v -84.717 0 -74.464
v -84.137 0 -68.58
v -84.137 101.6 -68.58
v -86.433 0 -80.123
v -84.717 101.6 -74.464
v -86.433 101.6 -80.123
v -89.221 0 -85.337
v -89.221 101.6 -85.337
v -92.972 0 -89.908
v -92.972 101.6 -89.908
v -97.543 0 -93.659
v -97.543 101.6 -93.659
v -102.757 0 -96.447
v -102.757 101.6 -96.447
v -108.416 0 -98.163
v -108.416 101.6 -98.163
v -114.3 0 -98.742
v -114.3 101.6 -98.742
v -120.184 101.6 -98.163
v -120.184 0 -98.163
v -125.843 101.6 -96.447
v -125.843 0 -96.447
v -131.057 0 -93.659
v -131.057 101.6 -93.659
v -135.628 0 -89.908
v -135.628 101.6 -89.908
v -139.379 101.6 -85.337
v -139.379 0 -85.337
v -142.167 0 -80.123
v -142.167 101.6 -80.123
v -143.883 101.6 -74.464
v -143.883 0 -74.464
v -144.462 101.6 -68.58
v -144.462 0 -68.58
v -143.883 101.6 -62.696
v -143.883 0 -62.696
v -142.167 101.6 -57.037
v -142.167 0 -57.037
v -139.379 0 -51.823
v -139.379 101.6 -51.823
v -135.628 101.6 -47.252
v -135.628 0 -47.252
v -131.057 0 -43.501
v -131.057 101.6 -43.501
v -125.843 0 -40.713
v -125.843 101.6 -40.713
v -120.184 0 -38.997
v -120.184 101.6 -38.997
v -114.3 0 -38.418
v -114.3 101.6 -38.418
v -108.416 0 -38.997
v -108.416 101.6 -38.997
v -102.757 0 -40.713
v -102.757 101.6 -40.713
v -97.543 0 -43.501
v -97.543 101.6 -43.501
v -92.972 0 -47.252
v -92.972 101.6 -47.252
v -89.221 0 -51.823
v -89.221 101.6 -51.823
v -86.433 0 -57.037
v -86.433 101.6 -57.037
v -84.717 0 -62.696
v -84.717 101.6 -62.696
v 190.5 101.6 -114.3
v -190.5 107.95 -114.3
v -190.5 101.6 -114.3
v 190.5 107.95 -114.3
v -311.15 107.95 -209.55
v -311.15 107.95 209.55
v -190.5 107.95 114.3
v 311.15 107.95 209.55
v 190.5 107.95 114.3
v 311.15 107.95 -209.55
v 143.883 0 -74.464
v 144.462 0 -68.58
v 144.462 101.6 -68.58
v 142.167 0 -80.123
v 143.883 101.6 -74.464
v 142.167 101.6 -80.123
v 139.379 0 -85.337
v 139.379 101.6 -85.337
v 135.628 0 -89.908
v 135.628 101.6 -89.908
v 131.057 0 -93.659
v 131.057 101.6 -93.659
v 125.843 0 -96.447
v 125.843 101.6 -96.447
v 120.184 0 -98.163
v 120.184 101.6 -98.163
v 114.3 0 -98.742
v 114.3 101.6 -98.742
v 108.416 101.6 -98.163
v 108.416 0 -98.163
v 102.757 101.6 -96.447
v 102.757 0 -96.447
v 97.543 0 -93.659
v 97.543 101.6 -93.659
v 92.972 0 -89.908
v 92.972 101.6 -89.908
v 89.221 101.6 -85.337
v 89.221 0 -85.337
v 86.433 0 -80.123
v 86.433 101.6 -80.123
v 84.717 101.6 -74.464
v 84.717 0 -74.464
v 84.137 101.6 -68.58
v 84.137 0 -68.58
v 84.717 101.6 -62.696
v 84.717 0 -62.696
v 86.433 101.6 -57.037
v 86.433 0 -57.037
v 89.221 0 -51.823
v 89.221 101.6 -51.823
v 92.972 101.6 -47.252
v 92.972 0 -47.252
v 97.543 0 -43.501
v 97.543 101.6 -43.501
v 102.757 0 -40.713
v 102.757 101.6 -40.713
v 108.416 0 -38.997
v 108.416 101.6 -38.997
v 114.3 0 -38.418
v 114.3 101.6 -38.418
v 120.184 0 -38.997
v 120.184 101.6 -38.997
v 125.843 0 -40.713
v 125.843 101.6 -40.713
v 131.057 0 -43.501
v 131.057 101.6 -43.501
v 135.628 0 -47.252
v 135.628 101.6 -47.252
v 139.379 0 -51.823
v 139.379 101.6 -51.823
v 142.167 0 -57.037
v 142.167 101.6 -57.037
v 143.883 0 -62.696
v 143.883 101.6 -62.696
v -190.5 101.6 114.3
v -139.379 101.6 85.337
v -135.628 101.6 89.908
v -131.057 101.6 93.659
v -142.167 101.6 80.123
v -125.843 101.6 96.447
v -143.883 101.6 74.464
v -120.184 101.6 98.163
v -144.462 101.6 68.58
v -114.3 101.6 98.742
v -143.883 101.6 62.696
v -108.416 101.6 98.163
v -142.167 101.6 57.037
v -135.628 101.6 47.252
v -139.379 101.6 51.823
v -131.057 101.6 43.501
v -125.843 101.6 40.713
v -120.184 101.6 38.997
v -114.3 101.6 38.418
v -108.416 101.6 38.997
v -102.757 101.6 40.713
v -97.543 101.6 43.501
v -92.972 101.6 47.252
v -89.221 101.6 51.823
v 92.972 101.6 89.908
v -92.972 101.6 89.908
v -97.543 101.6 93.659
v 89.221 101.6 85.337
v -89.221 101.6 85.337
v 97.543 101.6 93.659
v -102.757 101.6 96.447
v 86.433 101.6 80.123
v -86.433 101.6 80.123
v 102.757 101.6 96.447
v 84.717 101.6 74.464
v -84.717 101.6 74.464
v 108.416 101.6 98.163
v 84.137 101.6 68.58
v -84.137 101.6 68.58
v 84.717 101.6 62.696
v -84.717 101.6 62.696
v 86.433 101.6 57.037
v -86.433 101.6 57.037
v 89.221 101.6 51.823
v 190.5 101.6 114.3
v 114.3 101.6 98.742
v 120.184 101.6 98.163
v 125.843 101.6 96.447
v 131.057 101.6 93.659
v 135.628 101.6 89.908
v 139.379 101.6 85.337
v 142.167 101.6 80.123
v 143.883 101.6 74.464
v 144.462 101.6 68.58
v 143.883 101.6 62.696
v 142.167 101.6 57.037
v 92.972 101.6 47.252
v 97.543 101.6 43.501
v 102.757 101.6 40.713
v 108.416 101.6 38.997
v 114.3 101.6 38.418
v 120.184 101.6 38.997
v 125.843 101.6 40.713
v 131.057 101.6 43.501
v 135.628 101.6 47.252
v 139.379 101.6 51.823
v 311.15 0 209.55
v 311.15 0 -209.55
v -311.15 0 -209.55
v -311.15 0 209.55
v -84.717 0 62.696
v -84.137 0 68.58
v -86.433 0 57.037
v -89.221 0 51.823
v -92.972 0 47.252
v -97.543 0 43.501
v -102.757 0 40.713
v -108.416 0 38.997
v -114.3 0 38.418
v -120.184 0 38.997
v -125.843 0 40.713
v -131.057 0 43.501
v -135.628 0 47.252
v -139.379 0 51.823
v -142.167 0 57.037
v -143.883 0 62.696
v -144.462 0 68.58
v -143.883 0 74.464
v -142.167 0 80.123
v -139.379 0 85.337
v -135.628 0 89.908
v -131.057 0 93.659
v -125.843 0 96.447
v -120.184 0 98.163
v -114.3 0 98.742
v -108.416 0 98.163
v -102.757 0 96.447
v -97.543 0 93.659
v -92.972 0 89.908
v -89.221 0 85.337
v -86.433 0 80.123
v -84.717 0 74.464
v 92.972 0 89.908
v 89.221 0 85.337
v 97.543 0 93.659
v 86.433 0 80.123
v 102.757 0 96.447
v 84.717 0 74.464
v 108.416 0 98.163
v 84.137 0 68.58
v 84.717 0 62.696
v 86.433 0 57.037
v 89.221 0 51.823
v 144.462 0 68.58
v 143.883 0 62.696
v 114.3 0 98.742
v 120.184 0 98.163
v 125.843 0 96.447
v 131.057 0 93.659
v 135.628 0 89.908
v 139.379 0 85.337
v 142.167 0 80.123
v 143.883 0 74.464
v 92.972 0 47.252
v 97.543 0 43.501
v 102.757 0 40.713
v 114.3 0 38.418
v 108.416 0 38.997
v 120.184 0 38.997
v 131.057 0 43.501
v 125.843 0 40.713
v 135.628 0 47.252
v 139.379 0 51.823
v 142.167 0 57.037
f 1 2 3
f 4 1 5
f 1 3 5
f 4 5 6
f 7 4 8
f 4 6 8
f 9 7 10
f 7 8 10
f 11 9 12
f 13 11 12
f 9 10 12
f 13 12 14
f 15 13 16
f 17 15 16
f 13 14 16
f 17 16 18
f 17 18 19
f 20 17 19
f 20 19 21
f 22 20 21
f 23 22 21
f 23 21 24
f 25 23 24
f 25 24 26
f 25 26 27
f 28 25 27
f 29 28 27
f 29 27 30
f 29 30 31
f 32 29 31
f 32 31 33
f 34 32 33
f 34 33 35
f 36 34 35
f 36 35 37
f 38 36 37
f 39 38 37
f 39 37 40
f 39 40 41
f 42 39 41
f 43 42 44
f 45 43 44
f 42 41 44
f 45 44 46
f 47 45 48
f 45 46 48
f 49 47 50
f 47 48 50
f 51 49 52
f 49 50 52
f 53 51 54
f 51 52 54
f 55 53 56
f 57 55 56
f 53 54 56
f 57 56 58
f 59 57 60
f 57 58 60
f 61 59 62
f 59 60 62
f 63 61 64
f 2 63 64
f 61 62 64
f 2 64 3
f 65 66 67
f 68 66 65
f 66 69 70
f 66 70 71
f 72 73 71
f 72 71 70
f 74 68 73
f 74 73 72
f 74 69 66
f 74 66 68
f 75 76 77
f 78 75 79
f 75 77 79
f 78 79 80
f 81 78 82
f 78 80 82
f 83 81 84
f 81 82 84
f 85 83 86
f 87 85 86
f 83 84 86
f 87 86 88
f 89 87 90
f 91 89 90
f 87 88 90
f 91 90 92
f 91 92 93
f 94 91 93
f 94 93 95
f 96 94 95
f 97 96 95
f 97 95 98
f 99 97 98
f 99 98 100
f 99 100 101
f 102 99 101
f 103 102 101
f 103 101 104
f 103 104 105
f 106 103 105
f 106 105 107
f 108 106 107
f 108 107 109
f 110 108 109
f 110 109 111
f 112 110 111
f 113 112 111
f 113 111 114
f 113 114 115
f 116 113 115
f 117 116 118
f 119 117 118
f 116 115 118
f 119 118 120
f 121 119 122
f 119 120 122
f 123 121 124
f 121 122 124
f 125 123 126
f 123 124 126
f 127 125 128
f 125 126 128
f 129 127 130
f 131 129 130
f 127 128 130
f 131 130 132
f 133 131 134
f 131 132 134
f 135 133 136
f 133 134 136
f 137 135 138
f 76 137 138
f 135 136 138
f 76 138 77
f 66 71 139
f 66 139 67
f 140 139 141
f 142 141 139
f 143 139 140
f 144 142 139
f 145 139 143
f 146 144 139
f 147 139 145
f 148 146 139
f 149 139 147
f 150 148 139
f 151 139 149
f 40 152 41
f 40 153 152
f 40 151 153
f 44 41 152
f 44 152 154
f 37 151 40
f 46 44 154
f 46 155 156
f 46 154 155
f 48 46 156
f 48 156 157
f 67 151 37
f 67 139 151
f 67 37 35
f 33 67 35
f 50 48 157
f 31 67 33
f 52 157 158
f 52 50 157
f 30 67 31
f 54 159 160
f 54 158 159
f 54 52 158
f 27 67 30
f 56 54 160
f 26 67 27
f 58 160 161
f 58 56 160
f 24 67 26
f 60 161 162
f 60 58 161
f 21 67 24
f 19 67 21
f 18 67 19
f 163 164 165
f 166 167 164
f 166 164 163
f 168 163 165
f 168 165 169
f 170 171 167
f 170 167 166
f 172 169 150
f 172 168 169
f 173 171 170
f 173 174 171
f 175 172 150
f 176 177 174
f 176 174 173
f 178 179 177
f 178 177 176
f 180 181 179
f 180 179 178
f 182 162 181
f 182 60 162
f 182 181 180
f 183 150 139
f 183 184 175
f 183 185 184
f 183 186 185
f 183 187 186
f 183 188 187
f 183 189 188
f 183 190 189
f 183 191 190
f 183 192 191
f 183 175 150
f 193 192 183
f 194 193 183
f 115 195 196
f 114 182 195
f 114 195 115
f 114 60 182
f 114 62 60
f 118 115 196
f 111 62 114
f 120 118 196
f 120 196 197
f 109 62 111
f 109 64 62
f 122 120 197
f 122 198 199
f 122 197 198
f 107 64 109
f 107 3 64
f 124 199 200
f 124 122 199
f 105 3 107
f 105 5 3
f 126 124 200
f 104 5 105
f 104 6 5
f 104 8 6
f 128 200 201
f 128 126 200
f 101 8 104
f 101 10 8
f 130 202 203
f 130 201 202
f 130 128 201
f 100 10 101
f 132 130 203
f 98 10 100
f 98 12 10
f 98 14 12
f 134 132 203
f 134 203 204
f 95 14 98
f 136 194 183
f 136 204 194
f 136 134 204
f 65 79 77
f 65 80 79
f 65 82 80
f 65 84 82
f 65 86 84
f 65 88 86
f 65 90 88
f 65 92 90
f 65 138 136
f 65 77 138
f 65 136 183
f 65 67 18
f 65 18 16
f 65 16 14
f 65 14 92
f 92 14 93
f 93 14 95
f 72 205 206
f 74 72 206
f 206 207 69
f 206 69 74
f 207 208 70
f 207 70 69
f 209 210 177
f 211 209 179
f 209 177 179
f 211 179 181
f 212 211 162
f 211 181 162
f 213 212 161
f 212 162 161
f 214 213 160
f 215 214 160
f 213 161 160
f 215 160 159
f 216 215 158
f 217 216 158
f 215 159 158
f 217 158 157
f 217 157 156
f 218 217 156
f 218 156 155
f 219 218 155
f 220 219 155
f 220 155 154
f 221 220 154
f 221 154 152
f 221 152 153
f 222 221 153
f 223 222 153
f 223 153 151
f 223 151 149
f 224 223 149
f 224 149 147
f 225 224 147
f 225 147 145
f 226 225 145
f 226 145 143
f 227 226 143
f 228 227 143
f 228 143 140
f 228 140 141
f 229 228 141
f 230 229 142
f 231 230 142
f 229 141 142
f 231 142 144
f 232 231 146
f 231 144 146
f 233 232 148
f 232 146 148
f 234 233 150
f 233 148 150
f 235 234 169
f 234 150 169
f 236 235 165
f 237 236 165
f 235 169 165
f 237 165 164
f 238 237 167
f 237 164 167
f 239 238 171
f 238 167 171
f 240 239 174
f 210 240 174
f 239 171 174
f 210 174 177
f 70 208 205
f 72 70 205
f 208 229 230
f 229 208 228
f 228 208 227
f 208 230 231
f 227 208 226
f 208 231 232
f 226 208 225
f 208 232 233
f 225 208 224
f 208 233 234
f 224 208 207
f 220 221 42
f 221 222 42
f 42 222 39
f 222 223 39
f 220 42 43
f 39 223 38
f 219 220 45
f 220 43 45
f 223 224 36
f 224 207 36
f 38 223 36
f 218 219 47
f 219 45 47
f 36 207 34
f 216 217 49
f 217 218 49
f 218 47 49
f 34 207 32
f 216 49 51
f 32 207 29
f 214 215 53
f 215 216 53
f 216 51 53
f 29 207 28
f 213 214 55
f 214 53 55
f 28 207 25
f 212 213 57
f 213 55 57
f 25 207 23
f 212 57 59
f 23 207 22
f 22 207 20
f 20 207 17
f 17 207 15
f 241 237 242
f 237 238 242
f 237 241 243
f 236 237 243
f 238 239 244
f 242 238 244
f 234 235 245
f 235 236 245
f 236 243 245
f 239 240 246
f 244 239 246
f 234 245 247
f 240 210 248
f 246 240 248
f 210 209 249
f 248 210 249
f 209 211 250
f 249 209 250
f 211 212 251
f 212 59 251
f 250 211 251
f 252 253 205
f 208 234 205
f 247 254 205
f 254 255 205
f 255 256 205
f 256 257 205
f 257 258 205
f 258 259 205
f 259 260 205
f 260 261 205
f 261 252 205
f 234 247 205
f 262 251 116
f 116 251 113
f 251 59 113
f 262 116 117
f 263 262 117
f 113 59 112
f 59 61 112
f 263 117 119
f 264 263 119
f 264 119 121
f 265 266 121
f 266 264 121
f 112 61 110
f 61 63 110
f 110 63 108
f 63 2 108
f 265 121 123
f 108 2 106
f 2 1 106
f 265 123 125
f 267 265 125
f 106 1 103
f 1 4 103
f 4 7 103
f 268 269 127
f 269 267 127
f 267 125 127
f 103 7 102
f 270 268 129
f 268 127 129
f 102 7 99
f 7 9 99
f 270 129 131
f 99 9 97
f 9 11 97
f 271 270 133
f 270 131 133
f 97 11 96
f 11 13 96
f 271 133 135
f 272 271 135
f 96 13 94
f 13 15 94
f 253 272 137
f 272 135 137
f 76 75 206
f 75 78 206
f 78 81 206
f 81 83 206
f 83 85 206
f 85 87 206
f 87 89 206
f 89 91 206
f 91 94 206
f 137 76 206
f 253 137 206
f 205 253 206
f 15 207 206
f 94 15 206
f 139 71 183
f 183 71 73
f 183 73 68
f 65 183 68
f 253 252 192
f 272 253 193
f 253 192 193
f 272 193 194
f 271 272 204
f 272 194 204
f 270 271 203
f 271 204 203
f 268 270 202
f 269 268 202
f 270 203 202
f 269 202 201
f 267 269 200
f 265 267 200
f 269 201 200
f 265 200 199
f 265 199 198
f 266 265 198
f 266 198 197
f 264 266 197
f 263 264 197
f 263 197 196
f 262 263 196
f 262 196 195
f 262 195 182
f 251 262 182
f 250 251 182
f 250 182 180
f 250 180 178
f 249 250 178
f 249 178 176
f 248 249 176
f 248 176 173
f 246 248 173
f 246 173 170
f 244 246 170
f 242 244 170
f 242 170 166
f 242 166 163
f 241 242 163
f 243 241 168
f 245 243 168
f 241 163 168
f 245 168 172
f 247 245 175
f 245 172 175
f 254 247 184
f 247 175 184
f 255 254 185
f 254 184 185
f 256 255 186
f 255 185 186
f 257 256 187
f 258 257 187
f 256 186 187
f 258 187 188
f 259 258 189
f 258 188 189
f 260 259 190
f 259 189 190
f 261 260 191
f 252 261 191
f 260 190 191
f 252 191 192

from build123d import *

# Parameters (mm, degrees)
SKETCH1_W           = 622.3
SKETCH1_H           = 419.1
BOSS_EXTRUDE1_DEPTH = 107.95
SKETCH4_R           = 30.1625
CUT_EXTRUDE3_DEPTH  = 108.95
SKETCH5_W           = 381
SKETCH5_H           = 228.6
CUT_EXTRUDE4_DEPTH  = 6.35


with BuildPart() as part:
    # Sketch1 → Boss-Extrude1 (new body)
    with BuildSketch(Plane(origin=(0, 0, 0), x_dir=(1, 0, 0), z_dir=(0, 1, 0))):
        Rectangle(SKETCH1_W, SKETCH1_H)
    extrude(amount=BOSS_EXTRUDE1_DEPTH)

    # Sketch4 → Cut-Extrude3 (cut, through all)
    with BuildSketch(Plane(origin=(0, 107.95, 0), x_dir=(1, 0, 0), z_dir=(0, 1, 0))):
        with Locations((-114.3, 68.58)):
            Circle(SKETCH4_R)
        with Locations((-114.3, -68.58)):
            Circle(SKETCH4_R)
        with Locations((114.3, 68.58)):
            Circle(SKETCH4_R)
        with Locations((114.3, -68.58)):
            Circle(SKETCH4_R)
    extrude(amount=-CUT_EXTRUDE3_DEPTH, mode=Mode.SUBTRACT)

    # Sketch5 → Cut-Extrude4 (cut)
    with BuildSketch(Plane(origin=(0, 107.95, 0), x_dir=(1, 0, 0), z_dir=(0, 1, 0))):
        Rectangle(SKETCH5_W, SKETCH5_H)
    extrude(amount=-CUT_EXTRUDE4_DEPTH, mode=Mode.SUBTRACT)


solid = part.part
